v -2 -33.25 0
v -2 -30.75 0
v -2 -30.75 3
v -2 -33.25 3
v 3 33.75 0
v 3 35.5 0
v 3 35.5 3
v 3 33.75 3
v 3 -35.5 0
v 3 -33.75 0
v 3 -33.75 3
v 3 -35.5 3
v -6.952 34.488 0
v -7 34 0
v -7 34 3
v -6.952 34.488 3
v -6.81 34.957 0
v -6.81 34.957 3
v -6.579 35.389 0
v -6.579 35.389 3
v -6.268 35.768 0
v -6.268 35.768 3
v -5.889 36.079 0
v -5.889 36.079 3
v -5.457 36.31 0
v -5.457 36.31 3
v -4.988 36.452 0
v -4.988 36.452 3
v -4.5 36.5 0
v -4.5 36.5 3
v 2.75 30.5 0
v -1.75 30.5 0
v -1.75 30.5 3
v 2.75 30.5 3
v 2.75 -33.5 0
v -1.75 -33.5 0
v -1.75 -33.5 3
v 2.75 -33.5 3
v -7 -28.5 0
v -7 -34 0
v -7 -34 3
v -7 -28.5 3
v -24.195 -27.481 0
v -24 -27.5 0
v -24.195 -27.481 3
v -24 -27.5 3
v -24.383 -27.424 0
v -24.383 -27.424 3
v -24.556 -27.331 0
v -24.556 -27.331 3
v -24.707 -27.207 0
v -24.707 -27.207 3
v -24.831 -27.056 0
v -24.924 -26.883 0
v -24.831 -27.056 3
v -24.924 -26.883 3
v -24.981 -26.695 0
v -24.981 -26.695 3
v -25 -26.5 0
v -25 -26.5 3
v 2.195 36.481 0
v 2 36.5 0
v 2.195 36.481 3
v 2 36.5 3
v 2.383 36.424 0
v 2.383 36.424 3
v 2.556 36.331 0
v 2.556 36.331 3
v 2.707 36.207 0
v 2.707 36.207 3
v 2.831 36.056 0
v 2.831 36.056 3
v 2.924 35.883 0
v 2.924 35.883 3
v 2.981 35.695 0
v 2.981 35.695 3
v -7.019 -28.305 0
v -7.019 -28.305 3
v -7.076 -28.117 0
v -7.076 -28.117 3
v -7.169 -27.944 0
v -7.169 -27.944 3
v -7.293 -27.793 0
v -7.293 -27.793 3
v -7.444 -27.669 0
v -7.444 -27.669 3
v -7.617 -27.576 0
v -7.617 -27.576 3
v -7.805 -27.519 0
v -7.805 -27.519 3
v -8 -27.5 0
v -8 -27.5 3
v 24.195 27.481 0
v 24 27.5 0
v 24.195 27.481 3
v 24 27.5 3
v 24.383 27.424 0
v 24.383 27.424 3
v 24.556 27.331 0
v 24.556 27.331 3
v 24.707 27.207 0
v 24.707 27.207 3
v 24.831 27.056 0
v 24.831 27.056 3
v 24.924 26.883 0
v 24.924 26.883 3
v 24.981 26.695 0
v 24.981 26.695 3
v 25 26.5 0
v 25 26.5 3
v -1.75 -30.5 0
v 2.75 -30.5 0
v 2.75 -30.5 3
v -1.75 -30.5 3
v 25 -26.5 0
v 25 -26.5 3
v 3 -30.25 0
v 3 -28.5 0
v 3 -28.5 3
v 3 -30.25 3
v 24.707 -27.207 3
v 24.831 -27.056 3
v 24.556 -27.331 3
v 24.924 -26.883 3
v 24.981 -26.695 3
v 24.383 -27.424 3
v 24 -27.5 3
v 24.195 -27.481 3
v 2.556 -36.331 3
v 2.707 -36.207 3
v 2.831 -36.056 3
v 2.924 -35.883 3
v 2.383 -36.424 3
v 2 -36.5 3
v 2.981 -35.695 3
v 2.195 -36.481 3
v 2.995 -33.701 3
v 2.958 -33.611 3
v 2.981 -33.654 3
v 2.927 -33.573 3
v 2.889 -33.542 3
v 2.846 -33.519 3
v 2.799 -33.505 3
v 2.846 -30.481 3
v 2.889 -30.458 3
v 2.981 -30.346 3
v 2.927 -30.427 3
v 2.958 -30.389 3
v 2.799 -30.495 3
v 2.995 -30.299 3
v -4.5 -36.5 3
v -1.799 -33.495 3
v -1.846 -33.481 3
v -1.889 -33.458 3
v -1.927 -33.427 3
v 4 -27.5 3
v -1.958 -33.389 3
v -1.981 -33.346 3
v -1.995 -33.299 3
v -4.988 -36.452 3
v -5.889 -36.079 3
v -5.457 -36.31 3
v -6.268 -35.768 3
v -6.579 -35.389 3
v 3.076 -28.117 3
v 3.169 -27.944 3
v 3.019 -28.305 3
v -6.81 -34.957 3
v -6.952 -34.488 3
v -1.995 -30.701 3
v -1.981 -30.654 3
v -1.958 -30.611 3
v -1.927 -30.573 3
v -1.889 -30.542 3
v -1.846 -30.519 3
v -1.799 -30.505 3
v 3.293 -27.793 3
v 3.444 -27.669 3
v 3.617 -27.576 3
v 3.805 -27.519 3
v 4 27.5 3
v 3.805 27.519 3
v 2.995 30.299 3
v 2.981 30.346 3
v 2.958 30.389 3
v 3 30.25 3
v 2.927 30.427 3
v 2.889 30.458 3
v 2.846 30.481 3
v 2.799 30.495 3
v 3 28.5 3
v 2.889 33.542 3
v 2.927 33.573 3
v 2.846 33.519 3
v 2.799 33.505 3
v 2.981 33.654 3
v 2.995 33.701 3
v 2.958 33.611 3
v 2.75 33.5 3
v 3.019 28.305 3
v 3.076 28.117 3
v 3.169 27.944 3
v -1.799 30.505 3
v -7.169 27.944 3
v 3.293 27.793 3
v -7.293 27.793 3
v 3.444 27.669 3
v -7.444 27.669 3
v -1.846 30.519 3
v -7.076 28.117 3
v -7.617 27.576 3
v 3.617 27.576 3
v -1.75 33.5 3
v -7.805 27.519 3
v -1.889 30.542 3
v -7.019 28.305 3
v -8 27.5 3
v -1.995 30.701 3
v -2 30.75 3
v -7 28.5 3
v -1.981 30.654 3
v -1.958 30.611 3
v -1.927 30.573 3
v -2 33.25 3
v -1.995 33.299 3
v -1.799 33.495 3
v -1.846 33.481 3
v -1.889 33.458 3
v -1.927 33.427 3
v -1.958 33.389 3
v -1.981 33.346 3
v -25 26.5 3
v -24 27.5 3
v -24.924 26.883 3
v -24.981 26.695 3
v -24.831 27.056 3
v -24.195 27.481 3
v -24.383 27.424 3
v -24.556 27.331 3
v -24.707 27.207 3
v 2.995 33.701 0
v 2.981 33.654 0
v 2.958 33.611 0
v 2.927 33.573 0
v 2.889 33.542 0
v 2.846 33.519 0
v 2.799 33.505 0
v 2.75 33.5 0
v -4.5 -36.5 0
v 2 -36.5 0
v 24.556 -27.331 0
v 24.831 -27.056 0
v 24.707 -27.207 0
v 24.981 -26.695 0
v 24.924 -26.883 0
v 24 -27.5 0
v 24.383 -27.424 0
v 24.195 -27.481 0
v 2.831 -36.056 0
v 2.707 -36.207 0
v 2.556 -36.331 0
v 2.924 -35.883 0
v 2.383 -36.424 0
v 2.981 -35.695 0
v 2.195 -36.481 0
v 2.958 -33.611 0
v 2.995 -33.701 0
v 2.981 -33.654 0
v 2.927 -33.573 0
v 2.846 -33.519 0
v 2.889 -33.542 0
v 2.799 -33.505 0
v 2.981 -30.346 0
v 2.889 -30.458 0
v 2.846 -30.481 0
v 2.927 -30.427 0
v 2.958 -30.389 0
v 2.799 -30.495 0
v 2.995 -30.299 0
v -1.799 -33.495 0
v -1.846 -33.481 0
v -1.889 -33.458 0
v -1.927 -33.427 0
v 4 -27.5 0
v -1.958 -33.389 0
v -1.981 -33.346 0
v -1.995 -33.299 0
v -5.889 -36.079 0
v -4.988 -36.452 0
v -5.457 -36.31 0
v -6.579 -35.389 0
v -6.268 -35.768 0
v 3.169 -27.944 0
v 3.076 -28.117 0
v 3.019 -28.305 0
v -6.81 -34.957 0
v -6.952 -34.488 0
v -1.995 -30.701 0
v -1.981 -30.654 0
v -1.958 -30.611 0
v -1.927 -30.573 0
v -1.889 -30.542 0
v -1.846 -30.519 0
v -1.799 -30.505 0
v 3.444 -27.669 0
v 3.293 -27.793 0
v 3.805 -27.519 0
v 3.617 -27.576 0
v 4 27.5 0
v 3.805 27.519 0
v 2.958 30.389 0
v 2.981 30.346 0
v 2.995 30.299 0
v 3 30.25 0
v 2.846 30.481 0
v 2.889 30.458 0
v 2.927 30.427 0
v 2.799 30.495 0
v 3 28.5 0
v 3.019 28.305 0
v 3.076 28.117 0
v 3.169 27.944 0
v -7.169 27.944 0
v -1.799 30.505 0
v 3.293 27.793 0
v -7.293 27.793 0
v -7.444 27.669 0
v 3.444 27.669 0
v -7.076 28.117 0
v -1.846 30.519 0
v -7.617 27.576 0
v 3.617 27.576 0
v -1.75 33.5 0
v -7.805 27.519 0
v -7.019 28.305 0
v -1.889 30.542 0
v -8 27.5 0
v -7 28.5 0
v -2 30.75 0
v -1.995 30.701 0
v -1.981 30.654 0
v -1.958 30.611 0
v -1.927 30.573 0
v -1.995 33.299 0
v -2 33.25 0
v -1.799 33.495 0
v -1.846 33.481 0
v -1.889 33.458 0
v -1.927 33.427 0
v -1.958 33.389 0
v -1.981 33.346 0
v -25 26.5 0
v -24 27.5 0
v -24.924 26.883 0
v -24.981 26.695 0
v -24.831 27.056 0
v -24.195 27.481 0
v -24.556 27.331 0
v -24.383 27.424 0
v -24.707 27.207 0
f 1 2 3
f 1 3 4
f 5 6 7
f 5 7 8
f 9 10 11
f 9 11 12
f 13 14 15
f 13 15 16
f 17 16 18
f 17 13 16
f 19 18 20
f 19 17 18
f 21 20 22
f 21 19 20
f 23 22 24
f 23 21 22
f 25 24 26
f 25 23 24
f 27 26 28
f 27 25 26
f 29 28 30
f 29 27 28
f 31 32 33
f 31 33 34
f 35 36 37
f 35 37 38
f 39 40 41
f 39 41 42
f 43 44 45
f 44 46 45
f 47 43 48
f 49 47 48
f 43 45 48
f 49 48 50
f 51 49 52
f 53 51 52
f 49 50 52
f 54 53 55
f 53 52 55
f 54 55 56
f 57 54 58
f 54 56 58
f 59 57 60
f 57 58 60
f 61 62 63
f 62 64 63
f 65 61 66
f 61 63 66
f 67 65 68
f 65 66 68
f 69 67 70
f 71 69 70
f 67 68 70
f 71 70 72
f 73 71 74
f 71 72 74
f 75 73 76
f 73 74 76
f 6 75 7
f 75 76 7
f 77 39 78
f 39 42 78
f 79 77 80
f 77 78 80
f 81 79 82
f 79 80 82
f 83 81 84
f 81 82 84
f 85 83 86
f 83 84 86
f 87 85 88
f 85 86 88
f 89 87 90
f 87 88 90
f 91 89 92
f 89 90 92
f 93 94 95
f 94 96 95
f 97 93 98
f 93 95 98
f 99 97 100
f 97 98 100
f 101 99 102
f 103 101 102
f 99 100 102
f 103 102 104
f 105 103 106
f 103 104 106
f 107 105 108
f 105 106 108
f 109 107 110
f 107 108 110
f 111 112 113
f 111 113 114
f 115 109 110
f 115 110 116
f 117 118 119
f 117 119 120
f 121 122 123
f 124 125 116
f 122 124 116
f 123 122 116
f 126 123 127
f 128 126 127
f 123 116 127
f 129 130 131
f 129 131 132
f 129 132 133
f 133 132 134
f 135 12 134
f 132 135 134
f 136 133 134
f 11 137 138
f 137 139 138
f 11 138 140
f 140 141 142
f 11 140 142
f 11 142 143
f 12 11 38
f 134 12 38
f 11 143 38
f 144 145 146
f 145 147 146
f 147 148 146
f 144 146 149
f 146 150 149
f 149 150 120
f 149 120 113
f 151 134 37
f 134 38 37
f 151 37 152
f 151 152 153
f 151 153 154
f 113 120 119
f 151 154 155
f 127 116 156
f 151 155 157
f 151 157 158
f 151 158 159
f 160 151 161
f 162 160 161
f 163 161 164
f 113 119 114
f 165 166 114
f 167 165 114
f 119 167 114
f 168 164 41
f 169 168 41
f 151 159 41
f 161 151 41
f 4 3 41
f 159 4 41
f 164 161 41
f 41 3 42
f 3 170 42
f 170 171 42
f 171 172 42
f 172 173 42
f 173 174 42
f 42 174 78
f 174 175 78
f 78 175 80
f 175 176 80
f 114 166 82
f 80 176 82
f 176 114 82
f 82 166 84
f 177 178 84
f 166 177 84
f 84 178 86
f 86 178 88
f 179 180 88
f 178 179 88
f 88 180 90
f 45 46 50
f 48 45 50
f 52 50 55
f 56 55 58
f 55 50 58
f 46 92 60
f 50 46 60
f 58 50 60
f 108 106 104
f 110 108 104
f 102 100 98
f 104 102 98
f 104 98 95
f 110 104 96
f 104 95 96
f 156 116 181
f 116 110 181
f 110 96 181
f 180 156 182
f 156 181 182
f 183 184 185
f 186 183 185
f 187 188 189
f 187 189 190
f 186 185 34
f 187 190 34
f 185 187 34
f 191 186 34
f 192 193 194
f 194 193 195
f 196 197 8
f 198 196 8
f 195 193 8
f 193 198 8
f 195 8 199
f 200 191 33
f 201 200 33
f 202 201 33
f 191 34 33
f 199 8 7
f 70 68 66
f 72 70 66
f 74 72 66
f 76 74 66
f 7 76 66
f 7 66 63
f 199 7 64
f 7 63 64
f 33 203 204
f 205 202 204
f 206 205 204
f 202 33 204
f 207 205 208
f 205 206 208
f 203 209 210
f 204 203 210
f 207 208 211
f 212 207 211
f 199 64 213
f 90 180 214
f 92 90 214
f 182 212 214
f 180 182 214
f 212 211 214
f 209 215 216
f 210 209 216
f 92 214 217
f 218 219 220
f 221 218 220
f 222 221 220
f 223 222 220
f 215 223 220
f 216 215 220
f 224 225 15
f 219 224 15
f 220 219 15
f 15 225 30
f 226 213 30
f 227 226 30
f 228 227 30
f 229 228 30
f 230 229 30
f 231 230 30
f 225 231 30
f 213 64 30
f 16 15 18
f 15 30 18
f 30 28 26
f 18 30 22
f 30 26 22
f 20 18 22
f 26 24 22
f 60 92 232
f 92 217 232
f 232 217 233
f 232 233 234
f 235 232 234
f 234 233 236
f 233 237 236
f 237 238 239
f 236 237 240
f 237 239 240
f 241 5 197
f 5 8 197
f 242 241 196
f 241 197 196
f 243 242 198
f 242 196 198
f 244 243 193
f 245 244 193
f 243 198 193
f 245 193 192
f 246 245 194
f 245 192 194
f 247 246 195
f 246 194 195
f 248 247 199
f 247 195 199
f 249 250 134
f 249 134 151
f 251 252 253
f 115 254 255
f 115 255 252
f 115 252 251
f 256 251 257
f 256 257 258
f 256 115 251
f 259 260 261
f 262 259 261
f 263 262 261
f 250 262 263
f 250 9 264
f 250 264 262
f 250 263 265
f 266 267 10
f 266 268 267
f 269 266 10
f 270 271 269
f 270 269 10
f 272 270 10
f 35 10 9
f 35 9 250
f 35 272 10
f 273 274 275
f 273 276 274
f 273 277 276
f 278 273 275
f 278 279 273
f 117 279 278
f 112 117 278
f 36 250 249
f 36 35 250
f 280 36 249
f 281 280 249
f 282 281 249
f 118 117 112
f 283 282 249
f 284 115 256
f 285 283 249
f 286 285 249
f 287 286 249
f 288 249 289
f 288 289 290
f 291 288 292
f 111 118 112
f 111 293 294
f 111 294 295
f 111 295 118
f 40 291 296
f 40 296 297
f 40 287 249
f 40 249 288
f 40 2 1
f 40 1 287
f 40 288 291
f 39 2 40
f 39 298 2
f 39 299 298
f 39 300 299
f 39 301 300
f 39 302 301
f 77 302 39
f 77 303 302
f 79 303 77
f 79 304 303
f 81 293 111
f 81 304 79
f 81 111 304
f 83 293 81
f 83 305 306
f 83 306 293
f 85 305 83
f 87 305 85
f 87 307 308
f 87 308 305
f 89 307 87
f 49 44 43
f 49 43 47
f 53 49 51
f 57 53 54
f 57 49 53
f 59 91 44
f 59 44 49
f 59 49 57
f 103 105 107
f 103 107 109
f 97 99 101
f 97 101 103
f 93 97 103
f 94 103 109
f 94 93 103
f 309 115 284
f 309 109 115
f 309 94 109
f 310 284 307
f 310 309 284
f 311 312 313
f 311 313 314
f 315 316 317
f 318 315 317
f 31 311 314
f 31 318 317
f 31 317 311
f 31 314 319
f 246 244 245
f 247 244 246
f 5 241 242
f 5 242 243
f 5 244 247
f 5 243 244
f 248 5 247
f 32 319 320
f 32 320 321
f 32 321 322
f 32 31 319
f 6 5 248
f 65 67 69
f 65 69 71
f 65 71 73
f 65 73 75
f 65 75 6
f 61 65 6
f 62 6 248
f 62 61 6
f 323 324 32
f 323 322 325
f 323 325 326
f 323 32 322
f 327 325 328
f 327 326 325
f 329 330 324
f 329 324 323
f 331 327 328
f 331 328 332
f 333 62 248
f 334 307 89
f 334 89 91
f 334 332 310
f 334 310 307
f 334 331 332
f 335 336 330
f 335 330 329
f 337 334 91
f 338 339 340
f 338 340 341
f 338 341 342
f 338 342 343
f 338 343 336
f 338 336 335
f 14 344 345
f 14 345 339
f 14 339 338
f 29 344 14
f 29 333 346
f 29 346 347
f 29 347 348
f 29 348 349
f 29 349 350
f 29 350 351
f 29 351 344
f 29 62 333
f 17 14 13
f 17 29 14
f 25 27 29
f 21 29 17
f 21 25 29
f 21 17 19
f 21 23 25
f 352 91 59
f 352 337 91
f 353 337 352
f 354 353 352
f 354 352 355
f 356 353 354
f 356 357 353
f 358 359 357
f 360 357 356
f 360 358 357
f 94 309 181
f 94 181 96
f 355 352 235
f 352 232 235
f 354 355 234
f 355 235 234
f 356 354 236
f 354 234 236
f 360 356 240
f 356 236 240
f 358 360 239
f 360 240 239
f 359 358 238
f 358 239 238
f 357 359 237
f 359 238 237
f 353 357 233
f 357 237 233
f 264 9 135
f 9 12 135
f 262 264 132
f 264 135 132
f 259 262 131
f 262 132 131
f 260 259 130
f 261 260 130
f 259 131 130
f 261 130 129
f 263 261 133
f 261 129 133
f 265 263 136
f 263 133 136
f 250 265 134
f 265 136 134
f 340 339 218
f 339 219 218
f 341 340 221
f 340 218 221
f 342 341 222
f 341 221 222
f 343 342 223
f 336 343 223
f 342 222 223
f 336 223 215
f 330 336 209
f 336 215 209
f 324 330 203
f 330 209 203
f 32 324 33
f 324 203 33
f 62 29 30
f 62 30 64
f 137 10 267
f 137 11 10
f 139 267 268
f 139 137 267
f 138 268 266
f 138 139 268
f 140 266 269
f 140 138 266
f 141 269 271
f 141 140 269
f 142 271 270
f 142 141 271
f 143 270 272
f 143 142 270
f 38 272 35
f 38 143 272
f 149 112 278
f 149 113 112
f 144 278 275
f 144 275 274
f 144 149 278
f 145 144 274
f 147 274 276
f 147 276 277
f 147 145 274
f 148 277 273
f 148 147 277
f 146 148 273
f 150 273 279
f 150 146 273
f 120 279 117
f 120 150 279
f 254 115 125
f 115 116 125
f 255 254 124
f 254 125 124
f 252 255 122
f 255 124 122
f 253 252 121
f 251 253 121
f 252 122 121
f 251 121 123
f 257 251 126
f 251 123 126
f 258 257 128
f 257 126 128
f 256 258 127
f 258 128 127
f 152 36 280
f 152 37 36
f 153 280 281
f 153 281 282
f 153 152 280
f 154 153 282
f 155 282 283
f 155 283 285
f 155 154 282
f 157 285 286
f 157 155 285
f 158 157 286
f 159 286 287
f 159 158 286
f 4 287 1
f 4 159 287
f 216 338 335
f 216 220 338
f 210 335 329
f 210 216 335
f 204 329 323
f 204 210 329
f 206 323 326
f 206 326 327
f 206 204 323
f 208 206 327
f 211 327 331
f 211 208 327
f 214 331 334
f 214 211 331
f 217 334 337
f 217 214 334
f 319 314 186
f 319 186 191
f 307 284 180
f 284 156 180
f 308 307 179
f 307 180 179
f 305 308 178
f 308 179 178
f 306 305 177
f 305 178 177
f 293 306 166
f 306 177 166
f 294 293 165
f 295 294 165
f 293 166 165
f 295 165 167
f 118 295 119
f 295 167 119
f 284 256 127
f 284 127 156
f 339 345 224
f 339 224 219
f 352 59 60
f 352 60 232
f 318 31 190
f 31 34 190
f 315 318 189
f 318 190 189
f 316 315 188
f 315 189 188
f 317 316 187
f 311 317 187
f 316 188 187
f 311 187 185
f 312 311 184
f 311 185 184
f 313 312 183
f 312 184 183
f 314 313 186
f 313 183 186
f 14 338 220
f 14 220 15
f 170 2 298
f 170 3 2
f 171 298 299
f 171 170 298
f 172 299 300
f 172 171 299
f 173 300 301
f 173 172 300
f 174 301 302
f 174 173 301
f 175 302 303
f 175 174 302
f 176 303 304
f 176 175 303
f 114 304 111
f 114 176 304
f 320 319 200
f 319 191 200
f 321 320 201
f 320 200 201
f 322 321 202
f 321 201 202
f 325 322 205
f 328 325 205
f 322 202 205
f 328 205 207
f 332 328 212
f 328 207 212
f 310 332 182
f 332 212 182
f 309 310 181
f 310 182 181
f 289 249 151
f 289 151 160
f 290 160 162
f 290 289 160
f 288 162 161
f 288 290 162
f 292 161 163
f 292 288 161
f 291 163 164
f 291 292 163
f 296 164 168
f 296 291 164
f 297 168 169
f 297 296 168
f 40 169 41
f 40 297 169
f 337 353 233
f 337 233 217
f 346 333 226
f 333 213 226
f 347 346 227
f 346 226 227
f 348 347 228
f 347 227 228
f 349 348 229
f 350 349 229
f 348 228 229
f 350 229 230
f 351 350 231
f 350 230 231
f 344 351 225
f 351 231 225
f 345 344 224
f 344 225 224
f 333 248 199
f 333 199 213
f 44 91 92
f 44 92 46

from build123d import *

# Parameters (mm, degrees)
SALIENTE_EXTRUIR1_DEPTH = 3
REDONDEO1_R             = 1
REDONDEO2_R             = 0.25


with BuildPart() as part:
    # Croquis1 → Saliente-Extruir1 (new body)
    with BuildSketch(Plane.XY):
        with BuildLine():
            Line((-7, 27.5), (-7, 34))
            ThreePointArc((-7, 34), (-6.267766953, 35.767766953), (-4.5, 36.5))
            Line((-4.5, 36.5), (3, 36.5))
            Line((3, 36.5), (3, 33.5))
            Line((3, 33.5), (-2, 33.5))
            Line((-2, 33.5), (-2, 30.5))
            Line((-2, 30.5), (3, 30.5))
            Line((3, 30.5), (3, 27.5))
            Line((3, 27.5), (25, 27.5))
            Line((25, 27.5), (25, -27.5))
            Line((25, -27.5), (3, -27.5))
            Line((3, -27.5), (3, -30.5))
            Line((3, -30.5), (-2, -30.5))
            Line((-2, -30.5), (-2, -33.5))
            Line((-2, -33.5), (3, -33.5))
            Line((3, -33.5), (3, -36.5))
            Line((3, -36.5), (-4.5, -36.5))
            ThreePointArc((-4.5, -36.5), (-6.267766953, -35.767766953), (-7, -34))
            Line((-7, -34), (-7, -27.5))
            Line((-7, -27.5), (-25, -27.5))
            Line((-25, -27.5), (-25, 27.5))
            Line((-25, 27.5), (-7, 27.5))
        make_face()
    extrude(amount=SALIENTE_EXTRUIR1_DEPTH)

    # Redondeo1
    redondeo1_edges = [part.edges().sort_by_distance(p)[0] for p in [
        (-25, 27.5, 1.5),
        (-25, -27.5, 1.5),
        (-7, -27.5, 1.5),
        (3, -36.5, 1.5),
        (3, -27.5, 1.5),
        (25, -27.5, 1.5),
        (25, 27.5, 1.5),
        (3, 27.5, 1.5),
        (3, 36.5, 1.5),
        (-7, 27.5, 1.5),
    ]]
    fillet(redondeo1_edges, radius=REDONDEO1_R)

    # Redondeo2
    redondeo2_edges = [part.edges().sort_by_distance(p)[0] for p in [
        (3, -33.5, 1.5),
        (-2, -33.5, 1.5),
        (-2, -30.5, 1.5),
        (3, -30.5, 1.5),
        (3, 30.5, 1.5),
        (-2, 30.5, 1.5),
        (-2, 33.5, 1.5),
        (3, 33.5, 1.5),
    ]]
    fillet(redondeo2_edges, radius=REDONDEO2_R)


solid = part.part
